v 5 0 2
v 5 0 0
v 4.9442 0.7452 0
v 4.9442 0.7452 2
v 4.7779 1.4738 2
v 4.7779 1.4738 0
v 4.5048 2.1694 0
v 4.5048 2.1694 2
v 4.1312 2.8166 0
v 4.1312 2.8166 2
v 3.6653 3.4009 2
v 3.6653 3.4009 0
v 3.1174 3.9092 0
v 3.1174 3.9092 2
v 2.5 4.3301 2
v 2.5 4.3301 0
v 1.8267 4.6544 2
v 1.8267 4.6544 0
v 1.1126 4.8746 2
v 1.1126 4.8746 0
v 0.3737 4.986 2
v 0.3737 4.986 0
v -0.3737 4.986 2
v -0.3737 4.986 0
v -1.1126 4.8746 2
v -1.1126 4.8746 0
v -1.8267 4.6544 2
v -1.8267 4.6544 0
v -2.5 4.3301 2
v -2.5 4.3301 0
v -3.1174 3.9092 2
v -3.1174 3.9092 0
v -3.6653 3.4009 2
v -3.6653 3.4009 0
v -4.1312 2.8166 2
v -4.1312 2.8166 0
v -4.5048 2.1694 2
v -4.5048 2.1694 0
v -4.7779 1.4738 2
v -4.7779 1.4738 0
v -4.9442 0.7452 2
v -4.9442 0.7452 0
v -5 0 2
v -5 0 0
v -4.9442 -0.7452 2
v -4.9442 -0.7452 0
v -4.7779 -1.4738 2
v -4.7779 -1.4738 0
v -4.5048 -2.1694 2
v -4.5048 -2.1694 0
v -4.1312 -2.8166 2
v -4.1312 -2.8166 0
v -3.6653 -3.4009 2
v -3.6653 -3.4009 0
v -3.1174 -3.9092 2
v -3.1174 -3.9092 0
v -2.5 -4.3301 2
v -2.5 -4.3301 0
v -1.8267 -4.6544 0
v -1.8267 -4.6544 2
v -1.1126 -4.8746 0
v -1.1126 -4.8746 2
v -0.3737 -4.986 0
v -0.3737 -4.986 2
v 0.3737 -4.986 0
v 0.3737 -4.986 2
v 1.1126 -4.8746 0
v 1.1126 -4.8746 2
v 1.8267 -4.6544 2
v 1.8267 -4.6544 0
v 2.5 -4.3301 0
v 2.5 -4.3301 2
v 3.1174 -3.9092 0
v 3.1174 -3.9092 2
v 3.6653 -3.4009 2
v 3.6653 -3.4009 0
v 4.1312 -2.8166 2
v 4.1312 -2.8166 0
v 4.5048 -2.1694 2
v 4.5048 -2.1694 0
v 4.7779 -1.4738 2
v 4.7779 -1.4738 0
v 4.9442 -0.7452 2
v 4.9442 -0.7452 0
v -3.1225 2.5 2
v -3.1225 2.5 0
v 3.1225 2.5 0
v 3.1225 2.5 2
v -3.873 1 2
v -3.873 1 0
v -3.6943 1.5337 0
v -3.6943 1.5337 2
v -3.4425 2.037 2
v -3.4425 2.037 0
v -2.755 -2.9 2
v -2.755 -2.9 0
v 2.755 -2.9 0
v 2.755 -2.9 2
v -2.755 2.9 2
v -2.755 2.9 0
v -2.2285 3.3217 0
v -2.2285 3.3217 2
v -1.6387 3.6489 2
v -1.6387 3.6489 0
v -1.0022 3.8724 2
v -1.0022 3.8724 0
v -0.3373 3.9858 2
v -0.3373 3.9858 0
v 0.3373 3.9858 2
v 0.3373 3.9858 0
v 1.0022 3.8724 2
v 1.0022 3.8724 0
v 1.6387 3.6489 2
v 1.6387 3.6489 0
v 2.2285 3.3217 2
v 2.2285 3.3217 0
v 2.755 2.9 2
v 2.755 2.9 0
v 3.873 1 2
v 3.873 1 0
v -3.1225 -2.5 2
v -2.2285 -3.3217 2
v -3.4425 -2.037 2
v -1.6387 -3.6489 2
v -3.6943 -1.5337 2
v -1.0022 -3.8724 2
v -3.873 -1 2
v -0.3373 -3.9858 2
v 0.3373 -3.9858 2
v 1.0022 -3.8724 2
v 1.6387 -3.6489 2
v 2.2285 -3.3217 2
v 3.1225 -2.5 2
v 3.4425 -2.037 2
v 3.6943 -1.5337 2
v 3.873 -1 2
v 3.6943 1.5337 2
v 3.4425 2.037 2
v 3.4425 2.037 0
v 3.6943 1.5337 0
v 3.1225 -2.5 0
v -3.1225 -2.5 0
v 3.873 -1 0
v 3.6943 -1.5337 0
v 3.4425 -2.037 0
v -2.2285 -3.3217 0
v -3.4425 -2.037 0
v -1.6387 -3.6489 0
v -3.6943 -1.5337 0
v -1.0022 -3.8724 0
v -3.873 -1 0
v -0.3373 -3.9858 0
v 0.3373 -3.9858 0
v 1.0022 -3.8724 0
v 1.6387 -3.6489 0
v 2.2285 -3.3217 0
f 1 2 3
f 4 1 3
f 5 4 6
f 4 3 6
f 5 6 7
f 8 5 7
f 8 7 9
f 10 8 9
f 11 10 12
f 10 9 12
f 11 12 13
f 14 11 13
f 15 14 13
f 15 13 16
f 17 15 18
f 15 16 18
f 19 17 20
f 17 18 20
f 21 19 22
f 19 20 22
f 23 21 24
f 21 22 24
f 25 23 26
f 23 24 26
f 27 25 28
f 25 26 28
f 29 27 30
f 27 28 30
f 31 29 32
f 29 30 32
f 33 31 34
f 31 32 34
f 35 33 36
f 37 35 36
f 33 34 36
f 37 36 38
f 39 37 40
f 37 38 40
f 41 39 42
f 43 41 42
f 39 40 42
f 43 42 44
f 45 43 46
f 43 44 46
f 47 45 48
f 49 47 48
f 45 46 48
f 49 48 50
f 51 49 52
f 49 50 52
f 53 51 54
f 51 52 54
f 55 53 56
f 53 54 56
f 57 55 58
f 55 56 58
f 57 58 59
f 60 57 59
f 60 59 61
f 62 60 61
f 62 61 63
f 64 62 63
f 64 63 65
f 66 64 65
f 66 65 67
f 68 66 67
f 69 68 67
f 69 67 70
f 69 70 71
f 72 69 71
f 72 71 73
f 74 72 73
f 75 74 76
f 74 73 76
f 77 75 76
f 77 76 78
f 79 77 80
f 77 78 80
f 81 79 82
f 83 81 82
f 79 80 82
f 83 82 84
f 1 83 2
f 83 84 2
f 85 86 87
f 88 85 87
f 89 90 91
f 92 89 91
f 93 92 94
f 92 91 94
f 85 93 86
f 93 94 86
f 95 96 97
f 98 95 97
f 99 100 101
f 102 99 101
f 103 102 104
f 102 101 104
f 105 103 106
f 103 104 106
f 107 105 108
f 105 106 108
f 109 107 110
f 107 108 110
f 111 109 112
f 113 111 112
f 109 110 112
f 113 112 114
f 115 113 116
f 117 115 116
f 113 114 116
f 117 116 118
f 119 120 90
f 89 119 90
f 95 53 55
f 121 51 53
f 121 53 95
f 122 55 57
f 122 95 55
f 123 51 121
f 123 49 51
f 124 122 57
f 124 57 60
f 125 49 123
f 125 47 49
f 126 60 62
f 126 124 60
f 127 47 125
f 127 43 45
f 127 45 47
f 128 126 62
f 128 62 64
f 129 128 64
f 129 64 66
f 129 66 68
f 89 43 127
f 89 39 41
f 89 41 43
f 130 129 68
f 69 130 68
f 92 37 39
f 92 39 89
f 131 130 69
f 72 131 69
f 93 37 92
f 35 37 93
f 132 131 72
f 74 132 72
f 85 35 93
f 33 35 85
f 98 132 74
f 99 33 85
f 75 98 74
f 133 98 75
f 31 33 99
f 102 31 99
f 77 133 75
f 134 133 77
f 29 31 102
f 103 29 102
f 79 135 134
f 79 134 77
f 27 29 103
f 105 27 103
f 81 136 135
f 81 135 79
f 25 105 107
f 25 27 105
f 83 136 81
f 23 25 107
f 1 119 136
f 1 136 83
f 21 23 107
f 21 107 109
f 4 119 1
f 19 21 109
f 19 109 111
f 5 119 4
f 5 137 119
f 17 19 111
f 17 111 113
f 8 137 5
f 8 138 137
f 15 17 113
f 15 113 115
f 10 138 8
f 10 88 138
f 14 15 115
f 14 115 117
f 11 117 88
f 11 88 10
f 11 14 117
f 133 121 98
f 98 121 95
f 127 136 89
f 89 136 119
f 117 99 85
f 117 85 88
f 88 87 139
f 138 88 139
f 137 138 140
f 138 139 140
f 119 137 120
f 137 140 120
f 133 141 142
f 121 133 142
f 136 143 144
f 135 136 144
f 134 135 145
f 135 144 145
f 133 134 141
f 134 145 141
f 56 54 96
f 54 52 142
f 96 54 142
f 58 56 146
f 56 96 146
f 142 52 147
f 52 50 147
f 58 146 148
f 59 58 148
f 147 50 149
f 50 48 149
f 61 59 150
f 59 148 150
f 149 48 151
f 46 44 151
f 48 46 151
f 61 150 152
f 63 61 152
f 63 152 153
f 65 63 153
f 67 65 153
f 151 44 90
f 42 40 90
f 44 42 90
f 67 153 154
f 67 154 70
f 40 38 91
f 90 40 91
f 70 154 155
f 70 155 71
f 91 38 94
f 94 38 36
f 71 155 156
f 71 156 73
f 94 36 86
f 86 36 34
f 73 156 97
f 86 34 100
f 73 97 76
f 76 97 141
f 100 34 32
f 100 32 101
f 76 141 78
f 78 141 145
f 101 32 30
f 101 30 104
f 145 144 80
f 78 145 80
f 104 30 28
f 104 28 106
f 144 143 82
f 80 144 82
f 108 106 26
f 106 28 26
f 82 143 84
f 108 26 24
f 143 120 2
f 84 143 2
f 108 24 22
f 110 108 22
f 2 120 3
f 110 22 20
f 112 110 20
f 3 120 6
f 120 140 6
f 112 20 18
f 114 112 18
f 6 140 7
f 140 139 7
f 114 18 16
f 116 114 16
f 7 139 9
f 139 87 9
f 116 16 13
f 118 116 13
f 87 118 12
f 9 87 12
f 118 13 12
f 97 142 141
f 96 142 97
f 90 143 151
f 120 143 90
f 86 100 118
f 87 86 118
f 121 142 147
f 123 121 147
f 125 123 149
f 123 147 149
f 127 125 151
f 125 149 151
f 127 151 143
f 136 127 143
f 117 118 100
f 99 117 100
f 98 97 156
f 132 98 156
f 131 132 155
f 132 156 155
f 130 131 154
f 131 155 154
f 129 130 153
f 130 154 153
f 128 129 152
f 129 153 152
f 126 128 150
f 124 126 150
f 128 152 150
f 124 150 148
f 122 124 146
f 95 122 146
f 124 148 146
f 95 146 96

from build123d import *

# Parameters (mm, degrees)
F0_R     = 5
F1_DEPTH = 2
F2_DEPTH = 2
F3_DEPTH = 2
F4_DEPTH = 2


with BuildPart() as f1:
    # F0 (on Top) → F1 (new body)
    with BuildSketch(Plane.XY):
        Circle(F0_R)
        with BuildLine():
            ThreePointArc((3.8729833462, 1), (3.9681187851, 0.5040171699), (4, 0))
            ThreePointArc((4, 0), (3.9681187851, -0.5040171699), (3.8729833462, -1))
            ThreePointArc((3.8729833462, -1), (3.5772466103, -1.789778391), (3.1224989992, -2.5))
            ThreePointArc((3.1224989992, -2.5), (2.9455449899, -2.7062455011), (2.7549954628, -2.9))
            ThreePointArc((2.7549954628, -2.9), (0, -4), (-2.7549954628, -2.9))
            ThreePointArc((-2.7549954628, -2.9), (-2.9455449899, -2.7062455011), (-3.1224989992, -2.5))
            ThreePointArc((-3.1224989992, -2.5), (-3.5772466103, -1.789778391), (-3.8729833462, -1))
            ThreePointArc((-3.8729833462, -1), (-4, 0), (-3.8729833462, 1))
            ThreePointArc((-3.8729833462, 1), (-3.5772466103, 1.789778391), (-3.1224989992, 2.5))
            ThreePointArc((-3.1224989992, 2.5), (-2.9455449899, 2.7062455011), (-2.7549954628, 2.9))
            ThreePointArc((-2.7549954628, 2.9), (0, 4), (2.7549954628, 2.9))
            ThreePointArc((2.7549954628, 2.9), (2.9455449899, 2.7062455011), (3.1224989992, 2.5))
            ThreePointArc((3.1224989992, 2.5), (3.5772466103, 1.789778391), (3.8729833462, 1))
        make_face(mode=Mode.SUBTRACT)
    extrude(amount=F1_DEPTH)

    # F0 (on Top) → F2 (join)
    with BuildSketch(Plane.XY):
        with BuildLine():
            ThreePointArc((3.8729833462, -1), (3.9681187851, -0.5040171699), (4, 0))
            ThreePointArc((4, 0), (3.9681187851, 0.5040171699), (3.8729833462, 1))
            Line((3.8729833462, 1), (-2.1040285937, 1))
            Line((-2.1040285937, 1), (-3.8729833462, 1))
            ThreePointArc((-3.8729833462, 1), (-4, 0), (-3.8729833462, -1))
            Line((-3.8729833462, -1), (-2.1040285937, -1))
            Line((-2.1040285937, -1), (3.8729833462, -1))
        make_face()
    extrude(amount=F2_DEPTH)

    # F0 (on Top) → F3 (join)
    with BuildSketch(Plane.XY):
        with BuildLine():
            Line((-2.1040285937, 2.5), (3.1224989992, 2.5))
            ThreePointArc((3.1224989992, 2.5), (2.9455449899, 2.7062455011), (2.7549954628, 2.9))
            Line((2.7549954628, 2.9), (-0.8741539787, 2.9))
            Line((-0.8741539787, 2.9), (-2.7549954628, 2.9))
            ThreePointArc((-2.7549954628, 2.9), (-2.9455449899, 2.7062455011), (-3.1224989992, 2.5))
            Line((-3.1224989992, 2.5), (-2.1040285937, 2.5))
        make_face()
    extrude(amount=F3_DEPTH)

    # F0 (on Top) → F4 (join)
    with BuildSketch(Plane.XY):
        with BuildLine():
            ThreePointArc((2.7549954628, -2.9), (2.9455449899, -2.7062455011), (3.1224989992, -2.5))
            Line((3.1224989992, -2.5), (-2.1040285937, -2.5))
            Line((-2.1040285937, -2.5), (-3.1224989992, -2.5))
            ThreePointArc((-3.1224989992, -2.5), (-2.9455449899, -2.7062455011), (-2.7549954628, -2.9))
            Line((-2.7549954628, -2.9), (-1.2980791507, -2.9))
            Line((-1.2980791507, -2.9), (2.7549954628, -2.9))
        make_face()
    extrude(amount=F4_DEPTH)


solid = f1.part
